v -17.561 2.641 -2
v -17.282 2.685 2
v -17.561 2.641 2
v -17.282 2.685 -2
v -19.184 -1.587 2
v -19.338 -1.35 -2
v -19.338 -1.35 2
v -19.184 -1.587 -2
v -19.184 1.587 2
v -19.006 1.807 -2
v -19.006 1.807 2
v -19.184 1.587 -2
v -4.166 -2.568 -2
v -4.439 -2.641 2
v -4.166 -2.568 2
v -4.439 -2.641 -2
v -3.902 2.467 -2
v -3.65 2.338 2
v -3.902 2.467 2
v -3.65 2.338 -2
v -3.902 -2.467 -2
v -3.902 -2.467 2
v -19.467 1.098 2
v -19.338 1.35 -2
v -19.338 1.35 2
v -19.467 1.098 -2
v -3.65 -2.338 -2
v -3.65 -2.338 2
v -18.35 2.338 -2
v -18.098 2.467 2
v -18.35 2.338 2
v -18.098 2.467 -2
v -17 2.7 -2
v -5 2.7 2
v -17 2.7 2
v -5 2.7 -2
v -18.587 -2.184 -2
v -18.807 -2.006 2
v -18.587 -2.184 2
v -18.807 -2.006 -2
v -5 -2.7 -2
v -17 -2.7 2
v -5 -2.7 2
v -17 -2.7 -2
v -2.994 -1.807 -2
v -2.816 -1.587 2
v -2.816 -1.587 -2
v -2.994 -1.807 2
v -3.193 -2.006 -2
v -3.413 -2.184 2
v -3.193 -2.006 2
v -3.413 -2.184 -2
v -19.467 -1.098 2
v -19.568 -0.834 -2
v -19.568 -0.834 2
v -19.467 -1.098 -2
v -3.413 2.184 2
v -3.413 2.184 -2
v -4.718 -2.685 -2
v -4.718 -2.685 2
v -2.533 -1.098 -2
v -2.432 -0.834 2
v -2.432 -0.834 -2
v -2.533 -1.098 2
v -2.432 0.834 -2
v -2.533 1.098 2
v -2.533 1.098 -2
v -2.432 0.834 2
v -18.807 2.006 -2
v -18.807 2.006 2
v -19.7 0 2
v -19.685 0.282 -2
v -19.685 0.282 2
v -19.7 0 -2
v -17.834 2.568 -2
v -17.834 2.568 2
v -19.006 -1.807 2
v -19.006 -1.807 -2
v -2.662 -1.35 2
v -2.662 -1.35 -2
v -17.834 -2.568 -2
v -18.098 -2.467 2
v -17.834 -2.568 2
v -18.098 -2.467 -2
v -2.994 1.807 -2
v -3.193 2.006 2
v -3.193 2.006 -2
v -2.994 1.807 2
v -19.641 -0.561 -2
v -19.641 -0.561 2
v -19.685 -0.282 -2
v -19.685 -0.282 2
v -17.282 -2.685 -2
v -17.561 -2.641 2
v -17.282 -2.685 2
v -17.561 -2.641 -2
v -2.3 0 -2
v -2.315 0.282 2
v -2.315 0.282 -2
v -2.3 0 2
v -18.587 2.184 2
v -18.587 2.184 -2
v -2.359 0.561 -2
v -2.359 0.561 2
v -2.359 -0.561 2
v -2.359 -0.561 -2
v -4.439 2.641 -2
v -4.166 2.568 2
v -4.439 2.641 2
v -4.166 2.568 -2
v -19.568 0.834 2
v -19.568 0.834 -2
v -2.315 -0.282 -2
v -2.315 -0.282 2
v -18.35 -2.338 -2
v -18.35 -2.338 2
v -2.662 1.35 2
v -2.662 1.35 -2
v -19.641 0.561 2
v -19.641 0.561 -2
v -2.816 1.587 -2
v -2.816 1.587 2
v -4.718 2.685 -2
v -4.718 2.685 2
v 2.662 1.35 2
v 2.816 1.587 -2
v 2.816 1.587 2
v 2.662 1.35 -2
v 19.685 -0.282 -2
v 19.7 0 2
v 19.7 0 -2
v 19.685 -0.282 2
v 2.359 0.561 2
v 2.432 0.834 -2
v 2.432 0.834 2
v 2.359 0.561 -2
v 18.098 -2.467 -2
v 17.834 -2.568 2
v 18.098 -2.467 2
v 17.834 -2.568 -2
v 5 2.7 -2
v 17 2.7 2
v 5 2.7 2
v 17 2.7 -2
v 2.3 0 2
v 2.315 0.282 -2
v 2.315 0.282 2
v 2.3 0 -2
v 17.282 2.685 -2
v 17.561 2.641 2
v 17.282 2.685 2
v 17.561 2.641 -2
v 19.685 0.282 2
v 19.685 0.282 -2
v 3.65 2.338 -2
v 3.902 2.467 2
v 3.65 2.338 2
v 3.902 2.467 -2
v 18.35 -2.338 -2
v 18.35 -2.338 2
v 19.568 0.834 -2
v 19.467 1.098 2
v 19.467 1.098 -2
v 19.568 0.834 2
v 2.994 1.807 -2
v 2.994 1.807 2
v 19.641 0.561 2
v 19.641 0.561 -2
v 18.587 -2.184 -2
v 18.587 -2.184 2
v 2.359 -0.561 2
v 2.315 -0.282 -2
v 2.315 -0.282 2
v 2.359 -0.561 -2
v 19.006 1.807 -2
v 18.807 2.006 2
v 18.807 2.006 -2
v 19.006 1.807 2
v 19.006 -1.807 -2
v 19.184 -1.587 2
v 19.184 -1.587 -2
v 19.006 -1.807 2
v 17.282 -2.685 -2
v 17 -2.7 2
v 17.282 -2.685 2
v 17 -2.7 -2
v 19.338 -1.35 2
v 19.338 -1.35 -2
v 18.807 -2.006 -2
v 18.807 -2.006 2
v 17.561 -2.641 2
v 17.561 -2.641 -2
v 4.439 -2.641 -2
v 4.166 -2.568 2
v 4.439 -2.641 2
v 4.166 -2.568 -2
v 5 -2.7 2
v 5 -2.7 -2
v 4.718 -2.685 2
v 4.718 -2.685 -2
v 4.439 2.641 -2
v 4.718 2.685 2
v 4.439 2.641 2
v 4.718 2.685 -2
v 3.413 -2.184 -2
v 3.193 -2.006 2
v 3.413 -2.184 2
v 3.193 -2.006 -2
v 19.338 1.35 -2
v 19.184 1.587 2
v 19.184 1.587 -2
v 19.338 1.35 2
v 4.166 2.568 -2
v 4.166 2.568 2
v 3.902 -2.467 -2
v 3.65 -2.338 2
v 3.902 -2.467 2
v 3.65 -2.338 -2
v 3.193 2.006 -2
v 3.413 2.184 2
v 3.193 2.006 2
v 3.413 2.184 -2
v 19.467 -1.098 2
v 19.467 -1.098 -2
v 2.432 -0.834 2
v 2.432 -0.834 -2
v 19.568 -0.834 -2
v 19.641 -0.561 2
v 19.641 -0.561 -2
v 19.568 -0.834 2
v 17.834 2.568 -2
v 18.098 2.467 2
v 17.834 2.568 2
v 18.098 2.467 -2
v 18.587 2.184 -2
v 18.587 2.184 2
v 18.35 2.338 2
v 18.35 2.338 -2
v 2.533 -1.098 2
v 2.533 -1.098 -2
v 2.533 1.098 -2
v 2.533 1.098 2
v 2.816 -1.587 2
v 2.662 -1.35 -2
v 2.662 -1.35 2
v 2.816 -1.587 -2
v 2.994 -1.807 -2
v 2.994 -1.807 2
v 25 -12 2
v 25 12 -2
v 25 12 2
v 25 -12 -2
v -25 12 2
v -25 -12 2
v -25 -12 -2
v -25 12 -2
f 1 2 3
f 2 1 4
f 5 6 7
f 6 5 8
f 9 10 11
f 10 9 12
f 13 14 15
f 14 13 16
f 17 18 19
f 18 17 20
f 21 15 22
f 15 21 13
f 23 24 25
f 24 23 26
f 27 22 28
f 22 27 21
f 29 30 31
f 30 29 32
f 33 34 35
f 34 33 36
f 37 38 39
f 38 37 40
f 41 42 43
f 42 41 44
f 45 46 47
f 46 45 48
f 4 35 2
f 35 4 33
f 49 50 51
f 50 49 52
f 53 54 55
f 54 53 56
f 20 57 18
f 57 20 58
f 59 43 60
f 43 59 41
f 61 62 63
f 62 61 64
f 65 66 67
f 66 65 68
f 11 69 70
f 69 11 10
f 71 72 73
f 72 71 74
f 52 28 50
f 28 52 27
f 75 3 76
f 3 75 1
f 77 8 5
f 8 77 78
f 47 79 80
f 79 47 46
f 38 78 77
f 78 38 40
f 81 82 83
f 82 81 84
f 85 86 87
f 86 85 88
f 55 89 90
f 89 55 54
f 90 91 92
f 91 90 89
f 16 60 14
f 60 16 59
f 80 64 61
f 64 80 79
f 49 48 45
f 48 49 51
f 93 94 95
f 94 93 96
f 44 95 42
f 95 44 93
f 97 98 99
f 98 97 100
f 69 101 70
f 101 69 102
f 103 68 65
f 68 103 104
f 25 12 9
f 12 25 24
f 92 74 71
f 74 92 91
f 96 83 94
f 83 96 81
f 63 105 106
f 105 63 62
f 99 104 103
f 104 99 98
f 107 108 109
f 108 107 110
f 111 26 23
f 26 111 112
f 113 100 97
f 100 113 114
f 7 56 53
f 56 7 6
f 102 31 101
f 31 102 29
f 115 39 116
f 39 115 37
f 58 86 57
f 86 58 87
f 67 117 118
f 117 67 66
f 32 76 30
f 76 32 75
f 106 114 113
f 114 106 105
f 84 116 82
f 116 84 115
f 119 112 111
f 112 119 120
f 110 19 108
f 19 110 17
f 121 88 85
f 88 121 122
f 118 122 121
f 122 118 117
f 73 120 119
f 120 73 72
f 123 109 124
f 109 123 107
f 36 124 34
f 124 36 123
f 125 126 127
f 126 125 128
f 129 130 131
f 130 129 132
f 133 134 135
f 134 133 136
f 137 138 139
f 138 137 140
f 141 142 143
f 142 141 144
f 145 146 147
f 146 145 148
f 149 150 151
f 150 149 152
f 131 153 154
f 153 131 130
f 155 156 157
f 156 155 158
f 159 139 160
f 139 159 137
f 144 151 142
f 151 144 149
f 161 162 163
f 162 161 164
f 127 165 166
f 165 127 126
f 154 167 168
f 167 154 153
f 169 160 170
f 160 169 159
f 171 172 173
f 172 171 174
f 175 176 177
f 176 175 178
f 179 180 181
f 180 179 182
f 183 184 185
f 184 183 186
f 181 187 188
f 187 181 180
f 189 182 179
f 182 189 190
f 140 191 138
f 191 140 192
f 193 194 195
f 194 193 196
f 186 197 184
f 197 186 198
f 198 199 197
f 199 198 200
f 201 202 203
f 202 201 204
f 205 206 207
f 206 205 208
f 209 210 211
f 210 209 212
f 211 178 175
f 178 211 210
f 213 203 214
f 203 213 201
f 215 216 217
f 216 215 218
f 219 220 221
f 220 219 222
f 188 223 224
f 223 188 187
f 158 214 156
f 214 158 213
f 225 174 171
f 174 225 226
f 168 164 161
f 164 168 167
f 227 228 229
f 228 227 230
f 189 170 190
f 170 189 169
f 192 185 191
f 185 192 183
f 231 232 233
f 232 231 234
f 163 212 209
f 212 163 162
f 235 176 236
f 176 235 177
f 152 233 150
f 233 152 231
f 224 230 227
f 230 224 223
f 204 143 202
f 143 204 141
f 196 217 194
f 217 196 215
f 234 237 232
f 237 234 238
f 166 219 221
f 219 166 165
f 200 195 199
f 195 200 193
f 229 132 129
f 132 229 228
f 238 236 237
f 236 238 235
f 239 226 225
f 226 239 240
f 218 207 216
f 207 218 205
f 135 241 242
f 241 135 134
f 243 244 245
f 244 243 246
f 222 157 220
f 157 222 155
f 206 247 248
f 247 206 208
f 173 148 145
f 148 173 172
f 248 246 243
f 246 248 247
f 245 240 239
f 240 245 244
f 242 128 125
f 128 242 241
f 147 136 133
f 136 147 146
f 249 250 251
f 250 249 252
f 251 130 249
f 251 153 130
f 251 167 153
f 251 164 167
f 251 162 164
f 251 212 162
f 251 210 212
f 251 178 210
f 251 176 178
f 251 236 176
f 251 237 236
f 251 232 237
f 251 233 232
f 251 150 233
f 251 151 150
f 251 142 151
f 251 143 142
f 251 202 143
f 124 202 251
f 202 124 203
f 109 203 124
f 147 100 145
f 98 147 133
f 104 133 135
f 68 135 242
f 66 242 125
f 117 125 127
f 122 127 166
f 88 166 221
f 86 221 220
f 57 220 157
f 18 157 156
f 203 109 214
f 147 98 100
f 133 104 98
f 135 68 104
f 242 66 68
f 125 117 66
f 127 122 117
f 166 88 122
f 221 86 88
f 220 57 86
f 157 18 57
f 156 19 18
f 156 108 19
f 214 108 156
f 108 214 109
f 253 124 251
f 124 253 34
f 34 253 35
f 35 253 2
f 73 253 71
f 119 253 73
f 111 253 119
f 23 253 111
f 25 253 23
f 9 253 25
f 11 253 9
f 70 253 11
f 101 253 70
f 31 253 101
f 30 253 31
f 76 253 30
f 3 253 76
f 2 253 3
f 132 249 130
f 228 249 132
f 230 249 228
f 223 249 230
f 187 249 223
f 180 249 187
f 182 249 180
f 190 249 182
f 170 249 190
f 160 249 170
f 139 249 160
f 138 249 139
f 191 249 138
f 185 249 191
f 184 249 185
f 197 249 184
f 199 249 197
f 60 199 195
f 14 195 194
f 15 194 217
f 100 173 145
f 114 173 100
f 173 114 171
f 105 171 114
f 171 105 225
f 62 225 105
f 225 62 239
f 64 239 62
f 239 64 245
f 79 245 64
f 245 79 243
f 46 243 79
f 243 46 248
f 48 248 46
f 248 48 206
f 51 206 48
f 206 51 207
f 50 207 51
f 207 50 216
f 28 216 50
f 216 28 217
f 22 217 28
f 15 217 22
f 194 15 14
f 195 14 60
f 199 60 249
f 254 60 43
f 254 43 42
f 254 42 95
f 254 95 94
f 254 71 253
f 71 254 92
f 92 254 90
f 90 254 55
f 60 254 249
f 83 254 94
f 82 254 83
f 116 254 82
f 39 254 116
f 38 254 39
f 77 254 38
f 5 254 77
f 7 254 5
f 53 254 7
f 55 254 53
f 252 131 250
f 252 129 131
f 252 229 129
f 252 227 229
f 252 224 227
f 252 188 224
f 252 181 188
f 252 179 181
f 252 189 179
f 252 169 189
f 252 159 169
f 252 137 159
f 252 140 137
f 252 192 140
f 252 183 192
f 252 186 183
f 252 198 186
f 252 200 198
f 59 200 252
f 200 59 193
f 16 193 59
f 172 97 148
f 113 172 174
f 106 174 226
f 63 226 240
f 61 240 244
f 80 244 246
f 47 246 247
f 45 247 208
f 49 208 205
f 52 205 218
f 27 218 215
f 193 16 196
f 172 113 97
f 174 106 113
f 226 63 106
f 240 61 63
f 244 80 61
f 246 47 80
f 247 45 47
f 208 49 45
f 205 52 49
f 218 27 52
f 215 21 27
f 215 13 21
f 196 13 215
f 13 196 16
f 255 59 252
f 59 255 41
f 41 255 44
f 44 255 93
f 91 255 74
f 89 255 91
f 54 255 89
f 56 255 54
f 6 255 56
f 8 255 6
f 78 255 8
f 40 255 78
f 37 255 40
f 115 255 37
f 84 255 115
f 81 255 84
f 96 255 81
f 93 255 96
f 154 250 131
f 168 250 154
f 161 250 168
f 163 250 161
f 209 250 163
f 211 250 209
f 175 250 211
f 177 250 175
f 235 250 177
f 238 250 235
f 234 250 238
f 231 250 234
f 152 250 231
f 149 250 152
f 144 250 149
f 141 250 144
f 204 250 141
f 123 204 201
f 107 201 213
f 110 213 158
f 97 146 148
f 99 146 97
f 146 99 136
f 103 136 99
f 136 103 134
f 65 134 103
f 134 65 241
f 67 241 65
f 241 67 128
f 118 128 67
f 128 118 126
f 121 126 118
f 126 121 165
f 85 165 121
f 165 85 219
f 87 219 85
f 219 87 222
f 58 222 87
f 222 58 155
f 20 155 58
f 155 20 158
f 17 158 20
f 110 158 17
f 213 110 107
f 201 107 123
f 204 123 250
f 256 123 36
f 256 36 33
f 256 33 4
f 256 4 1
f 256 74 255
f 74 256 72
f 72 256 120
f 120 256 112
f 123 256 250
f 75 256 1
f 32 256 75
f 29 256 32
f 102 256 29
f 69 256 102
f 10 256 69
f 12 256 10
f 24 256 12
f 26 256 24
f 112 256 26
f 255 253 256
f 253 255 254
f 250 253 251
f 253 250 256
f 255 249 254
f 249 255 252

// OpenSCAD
// Slotted mounting plate.
$fn = 60;
eps = 0.02;
plate_l = 50;
plate_w = 24;
plate_t = 4;
slot_l = 12;
slot_d = 5.4;
module slot(x) { hull() { translate([x-slot_l/2,0,-plate_t/2-eps]) cylinder(d=slot_d,h=plate_t+2*eps); translate([x+slot_l/2,0,-plate_t/2-eps]) cylinder(d=slot_d,h=plate_t+2*eps); } }
difference() { cube([plate_l, plate_w, plate_t], center=true); for (i=[0:1]) slot(-plate_l/2+14+i*(plate_l-28)/max(1,1)); }
